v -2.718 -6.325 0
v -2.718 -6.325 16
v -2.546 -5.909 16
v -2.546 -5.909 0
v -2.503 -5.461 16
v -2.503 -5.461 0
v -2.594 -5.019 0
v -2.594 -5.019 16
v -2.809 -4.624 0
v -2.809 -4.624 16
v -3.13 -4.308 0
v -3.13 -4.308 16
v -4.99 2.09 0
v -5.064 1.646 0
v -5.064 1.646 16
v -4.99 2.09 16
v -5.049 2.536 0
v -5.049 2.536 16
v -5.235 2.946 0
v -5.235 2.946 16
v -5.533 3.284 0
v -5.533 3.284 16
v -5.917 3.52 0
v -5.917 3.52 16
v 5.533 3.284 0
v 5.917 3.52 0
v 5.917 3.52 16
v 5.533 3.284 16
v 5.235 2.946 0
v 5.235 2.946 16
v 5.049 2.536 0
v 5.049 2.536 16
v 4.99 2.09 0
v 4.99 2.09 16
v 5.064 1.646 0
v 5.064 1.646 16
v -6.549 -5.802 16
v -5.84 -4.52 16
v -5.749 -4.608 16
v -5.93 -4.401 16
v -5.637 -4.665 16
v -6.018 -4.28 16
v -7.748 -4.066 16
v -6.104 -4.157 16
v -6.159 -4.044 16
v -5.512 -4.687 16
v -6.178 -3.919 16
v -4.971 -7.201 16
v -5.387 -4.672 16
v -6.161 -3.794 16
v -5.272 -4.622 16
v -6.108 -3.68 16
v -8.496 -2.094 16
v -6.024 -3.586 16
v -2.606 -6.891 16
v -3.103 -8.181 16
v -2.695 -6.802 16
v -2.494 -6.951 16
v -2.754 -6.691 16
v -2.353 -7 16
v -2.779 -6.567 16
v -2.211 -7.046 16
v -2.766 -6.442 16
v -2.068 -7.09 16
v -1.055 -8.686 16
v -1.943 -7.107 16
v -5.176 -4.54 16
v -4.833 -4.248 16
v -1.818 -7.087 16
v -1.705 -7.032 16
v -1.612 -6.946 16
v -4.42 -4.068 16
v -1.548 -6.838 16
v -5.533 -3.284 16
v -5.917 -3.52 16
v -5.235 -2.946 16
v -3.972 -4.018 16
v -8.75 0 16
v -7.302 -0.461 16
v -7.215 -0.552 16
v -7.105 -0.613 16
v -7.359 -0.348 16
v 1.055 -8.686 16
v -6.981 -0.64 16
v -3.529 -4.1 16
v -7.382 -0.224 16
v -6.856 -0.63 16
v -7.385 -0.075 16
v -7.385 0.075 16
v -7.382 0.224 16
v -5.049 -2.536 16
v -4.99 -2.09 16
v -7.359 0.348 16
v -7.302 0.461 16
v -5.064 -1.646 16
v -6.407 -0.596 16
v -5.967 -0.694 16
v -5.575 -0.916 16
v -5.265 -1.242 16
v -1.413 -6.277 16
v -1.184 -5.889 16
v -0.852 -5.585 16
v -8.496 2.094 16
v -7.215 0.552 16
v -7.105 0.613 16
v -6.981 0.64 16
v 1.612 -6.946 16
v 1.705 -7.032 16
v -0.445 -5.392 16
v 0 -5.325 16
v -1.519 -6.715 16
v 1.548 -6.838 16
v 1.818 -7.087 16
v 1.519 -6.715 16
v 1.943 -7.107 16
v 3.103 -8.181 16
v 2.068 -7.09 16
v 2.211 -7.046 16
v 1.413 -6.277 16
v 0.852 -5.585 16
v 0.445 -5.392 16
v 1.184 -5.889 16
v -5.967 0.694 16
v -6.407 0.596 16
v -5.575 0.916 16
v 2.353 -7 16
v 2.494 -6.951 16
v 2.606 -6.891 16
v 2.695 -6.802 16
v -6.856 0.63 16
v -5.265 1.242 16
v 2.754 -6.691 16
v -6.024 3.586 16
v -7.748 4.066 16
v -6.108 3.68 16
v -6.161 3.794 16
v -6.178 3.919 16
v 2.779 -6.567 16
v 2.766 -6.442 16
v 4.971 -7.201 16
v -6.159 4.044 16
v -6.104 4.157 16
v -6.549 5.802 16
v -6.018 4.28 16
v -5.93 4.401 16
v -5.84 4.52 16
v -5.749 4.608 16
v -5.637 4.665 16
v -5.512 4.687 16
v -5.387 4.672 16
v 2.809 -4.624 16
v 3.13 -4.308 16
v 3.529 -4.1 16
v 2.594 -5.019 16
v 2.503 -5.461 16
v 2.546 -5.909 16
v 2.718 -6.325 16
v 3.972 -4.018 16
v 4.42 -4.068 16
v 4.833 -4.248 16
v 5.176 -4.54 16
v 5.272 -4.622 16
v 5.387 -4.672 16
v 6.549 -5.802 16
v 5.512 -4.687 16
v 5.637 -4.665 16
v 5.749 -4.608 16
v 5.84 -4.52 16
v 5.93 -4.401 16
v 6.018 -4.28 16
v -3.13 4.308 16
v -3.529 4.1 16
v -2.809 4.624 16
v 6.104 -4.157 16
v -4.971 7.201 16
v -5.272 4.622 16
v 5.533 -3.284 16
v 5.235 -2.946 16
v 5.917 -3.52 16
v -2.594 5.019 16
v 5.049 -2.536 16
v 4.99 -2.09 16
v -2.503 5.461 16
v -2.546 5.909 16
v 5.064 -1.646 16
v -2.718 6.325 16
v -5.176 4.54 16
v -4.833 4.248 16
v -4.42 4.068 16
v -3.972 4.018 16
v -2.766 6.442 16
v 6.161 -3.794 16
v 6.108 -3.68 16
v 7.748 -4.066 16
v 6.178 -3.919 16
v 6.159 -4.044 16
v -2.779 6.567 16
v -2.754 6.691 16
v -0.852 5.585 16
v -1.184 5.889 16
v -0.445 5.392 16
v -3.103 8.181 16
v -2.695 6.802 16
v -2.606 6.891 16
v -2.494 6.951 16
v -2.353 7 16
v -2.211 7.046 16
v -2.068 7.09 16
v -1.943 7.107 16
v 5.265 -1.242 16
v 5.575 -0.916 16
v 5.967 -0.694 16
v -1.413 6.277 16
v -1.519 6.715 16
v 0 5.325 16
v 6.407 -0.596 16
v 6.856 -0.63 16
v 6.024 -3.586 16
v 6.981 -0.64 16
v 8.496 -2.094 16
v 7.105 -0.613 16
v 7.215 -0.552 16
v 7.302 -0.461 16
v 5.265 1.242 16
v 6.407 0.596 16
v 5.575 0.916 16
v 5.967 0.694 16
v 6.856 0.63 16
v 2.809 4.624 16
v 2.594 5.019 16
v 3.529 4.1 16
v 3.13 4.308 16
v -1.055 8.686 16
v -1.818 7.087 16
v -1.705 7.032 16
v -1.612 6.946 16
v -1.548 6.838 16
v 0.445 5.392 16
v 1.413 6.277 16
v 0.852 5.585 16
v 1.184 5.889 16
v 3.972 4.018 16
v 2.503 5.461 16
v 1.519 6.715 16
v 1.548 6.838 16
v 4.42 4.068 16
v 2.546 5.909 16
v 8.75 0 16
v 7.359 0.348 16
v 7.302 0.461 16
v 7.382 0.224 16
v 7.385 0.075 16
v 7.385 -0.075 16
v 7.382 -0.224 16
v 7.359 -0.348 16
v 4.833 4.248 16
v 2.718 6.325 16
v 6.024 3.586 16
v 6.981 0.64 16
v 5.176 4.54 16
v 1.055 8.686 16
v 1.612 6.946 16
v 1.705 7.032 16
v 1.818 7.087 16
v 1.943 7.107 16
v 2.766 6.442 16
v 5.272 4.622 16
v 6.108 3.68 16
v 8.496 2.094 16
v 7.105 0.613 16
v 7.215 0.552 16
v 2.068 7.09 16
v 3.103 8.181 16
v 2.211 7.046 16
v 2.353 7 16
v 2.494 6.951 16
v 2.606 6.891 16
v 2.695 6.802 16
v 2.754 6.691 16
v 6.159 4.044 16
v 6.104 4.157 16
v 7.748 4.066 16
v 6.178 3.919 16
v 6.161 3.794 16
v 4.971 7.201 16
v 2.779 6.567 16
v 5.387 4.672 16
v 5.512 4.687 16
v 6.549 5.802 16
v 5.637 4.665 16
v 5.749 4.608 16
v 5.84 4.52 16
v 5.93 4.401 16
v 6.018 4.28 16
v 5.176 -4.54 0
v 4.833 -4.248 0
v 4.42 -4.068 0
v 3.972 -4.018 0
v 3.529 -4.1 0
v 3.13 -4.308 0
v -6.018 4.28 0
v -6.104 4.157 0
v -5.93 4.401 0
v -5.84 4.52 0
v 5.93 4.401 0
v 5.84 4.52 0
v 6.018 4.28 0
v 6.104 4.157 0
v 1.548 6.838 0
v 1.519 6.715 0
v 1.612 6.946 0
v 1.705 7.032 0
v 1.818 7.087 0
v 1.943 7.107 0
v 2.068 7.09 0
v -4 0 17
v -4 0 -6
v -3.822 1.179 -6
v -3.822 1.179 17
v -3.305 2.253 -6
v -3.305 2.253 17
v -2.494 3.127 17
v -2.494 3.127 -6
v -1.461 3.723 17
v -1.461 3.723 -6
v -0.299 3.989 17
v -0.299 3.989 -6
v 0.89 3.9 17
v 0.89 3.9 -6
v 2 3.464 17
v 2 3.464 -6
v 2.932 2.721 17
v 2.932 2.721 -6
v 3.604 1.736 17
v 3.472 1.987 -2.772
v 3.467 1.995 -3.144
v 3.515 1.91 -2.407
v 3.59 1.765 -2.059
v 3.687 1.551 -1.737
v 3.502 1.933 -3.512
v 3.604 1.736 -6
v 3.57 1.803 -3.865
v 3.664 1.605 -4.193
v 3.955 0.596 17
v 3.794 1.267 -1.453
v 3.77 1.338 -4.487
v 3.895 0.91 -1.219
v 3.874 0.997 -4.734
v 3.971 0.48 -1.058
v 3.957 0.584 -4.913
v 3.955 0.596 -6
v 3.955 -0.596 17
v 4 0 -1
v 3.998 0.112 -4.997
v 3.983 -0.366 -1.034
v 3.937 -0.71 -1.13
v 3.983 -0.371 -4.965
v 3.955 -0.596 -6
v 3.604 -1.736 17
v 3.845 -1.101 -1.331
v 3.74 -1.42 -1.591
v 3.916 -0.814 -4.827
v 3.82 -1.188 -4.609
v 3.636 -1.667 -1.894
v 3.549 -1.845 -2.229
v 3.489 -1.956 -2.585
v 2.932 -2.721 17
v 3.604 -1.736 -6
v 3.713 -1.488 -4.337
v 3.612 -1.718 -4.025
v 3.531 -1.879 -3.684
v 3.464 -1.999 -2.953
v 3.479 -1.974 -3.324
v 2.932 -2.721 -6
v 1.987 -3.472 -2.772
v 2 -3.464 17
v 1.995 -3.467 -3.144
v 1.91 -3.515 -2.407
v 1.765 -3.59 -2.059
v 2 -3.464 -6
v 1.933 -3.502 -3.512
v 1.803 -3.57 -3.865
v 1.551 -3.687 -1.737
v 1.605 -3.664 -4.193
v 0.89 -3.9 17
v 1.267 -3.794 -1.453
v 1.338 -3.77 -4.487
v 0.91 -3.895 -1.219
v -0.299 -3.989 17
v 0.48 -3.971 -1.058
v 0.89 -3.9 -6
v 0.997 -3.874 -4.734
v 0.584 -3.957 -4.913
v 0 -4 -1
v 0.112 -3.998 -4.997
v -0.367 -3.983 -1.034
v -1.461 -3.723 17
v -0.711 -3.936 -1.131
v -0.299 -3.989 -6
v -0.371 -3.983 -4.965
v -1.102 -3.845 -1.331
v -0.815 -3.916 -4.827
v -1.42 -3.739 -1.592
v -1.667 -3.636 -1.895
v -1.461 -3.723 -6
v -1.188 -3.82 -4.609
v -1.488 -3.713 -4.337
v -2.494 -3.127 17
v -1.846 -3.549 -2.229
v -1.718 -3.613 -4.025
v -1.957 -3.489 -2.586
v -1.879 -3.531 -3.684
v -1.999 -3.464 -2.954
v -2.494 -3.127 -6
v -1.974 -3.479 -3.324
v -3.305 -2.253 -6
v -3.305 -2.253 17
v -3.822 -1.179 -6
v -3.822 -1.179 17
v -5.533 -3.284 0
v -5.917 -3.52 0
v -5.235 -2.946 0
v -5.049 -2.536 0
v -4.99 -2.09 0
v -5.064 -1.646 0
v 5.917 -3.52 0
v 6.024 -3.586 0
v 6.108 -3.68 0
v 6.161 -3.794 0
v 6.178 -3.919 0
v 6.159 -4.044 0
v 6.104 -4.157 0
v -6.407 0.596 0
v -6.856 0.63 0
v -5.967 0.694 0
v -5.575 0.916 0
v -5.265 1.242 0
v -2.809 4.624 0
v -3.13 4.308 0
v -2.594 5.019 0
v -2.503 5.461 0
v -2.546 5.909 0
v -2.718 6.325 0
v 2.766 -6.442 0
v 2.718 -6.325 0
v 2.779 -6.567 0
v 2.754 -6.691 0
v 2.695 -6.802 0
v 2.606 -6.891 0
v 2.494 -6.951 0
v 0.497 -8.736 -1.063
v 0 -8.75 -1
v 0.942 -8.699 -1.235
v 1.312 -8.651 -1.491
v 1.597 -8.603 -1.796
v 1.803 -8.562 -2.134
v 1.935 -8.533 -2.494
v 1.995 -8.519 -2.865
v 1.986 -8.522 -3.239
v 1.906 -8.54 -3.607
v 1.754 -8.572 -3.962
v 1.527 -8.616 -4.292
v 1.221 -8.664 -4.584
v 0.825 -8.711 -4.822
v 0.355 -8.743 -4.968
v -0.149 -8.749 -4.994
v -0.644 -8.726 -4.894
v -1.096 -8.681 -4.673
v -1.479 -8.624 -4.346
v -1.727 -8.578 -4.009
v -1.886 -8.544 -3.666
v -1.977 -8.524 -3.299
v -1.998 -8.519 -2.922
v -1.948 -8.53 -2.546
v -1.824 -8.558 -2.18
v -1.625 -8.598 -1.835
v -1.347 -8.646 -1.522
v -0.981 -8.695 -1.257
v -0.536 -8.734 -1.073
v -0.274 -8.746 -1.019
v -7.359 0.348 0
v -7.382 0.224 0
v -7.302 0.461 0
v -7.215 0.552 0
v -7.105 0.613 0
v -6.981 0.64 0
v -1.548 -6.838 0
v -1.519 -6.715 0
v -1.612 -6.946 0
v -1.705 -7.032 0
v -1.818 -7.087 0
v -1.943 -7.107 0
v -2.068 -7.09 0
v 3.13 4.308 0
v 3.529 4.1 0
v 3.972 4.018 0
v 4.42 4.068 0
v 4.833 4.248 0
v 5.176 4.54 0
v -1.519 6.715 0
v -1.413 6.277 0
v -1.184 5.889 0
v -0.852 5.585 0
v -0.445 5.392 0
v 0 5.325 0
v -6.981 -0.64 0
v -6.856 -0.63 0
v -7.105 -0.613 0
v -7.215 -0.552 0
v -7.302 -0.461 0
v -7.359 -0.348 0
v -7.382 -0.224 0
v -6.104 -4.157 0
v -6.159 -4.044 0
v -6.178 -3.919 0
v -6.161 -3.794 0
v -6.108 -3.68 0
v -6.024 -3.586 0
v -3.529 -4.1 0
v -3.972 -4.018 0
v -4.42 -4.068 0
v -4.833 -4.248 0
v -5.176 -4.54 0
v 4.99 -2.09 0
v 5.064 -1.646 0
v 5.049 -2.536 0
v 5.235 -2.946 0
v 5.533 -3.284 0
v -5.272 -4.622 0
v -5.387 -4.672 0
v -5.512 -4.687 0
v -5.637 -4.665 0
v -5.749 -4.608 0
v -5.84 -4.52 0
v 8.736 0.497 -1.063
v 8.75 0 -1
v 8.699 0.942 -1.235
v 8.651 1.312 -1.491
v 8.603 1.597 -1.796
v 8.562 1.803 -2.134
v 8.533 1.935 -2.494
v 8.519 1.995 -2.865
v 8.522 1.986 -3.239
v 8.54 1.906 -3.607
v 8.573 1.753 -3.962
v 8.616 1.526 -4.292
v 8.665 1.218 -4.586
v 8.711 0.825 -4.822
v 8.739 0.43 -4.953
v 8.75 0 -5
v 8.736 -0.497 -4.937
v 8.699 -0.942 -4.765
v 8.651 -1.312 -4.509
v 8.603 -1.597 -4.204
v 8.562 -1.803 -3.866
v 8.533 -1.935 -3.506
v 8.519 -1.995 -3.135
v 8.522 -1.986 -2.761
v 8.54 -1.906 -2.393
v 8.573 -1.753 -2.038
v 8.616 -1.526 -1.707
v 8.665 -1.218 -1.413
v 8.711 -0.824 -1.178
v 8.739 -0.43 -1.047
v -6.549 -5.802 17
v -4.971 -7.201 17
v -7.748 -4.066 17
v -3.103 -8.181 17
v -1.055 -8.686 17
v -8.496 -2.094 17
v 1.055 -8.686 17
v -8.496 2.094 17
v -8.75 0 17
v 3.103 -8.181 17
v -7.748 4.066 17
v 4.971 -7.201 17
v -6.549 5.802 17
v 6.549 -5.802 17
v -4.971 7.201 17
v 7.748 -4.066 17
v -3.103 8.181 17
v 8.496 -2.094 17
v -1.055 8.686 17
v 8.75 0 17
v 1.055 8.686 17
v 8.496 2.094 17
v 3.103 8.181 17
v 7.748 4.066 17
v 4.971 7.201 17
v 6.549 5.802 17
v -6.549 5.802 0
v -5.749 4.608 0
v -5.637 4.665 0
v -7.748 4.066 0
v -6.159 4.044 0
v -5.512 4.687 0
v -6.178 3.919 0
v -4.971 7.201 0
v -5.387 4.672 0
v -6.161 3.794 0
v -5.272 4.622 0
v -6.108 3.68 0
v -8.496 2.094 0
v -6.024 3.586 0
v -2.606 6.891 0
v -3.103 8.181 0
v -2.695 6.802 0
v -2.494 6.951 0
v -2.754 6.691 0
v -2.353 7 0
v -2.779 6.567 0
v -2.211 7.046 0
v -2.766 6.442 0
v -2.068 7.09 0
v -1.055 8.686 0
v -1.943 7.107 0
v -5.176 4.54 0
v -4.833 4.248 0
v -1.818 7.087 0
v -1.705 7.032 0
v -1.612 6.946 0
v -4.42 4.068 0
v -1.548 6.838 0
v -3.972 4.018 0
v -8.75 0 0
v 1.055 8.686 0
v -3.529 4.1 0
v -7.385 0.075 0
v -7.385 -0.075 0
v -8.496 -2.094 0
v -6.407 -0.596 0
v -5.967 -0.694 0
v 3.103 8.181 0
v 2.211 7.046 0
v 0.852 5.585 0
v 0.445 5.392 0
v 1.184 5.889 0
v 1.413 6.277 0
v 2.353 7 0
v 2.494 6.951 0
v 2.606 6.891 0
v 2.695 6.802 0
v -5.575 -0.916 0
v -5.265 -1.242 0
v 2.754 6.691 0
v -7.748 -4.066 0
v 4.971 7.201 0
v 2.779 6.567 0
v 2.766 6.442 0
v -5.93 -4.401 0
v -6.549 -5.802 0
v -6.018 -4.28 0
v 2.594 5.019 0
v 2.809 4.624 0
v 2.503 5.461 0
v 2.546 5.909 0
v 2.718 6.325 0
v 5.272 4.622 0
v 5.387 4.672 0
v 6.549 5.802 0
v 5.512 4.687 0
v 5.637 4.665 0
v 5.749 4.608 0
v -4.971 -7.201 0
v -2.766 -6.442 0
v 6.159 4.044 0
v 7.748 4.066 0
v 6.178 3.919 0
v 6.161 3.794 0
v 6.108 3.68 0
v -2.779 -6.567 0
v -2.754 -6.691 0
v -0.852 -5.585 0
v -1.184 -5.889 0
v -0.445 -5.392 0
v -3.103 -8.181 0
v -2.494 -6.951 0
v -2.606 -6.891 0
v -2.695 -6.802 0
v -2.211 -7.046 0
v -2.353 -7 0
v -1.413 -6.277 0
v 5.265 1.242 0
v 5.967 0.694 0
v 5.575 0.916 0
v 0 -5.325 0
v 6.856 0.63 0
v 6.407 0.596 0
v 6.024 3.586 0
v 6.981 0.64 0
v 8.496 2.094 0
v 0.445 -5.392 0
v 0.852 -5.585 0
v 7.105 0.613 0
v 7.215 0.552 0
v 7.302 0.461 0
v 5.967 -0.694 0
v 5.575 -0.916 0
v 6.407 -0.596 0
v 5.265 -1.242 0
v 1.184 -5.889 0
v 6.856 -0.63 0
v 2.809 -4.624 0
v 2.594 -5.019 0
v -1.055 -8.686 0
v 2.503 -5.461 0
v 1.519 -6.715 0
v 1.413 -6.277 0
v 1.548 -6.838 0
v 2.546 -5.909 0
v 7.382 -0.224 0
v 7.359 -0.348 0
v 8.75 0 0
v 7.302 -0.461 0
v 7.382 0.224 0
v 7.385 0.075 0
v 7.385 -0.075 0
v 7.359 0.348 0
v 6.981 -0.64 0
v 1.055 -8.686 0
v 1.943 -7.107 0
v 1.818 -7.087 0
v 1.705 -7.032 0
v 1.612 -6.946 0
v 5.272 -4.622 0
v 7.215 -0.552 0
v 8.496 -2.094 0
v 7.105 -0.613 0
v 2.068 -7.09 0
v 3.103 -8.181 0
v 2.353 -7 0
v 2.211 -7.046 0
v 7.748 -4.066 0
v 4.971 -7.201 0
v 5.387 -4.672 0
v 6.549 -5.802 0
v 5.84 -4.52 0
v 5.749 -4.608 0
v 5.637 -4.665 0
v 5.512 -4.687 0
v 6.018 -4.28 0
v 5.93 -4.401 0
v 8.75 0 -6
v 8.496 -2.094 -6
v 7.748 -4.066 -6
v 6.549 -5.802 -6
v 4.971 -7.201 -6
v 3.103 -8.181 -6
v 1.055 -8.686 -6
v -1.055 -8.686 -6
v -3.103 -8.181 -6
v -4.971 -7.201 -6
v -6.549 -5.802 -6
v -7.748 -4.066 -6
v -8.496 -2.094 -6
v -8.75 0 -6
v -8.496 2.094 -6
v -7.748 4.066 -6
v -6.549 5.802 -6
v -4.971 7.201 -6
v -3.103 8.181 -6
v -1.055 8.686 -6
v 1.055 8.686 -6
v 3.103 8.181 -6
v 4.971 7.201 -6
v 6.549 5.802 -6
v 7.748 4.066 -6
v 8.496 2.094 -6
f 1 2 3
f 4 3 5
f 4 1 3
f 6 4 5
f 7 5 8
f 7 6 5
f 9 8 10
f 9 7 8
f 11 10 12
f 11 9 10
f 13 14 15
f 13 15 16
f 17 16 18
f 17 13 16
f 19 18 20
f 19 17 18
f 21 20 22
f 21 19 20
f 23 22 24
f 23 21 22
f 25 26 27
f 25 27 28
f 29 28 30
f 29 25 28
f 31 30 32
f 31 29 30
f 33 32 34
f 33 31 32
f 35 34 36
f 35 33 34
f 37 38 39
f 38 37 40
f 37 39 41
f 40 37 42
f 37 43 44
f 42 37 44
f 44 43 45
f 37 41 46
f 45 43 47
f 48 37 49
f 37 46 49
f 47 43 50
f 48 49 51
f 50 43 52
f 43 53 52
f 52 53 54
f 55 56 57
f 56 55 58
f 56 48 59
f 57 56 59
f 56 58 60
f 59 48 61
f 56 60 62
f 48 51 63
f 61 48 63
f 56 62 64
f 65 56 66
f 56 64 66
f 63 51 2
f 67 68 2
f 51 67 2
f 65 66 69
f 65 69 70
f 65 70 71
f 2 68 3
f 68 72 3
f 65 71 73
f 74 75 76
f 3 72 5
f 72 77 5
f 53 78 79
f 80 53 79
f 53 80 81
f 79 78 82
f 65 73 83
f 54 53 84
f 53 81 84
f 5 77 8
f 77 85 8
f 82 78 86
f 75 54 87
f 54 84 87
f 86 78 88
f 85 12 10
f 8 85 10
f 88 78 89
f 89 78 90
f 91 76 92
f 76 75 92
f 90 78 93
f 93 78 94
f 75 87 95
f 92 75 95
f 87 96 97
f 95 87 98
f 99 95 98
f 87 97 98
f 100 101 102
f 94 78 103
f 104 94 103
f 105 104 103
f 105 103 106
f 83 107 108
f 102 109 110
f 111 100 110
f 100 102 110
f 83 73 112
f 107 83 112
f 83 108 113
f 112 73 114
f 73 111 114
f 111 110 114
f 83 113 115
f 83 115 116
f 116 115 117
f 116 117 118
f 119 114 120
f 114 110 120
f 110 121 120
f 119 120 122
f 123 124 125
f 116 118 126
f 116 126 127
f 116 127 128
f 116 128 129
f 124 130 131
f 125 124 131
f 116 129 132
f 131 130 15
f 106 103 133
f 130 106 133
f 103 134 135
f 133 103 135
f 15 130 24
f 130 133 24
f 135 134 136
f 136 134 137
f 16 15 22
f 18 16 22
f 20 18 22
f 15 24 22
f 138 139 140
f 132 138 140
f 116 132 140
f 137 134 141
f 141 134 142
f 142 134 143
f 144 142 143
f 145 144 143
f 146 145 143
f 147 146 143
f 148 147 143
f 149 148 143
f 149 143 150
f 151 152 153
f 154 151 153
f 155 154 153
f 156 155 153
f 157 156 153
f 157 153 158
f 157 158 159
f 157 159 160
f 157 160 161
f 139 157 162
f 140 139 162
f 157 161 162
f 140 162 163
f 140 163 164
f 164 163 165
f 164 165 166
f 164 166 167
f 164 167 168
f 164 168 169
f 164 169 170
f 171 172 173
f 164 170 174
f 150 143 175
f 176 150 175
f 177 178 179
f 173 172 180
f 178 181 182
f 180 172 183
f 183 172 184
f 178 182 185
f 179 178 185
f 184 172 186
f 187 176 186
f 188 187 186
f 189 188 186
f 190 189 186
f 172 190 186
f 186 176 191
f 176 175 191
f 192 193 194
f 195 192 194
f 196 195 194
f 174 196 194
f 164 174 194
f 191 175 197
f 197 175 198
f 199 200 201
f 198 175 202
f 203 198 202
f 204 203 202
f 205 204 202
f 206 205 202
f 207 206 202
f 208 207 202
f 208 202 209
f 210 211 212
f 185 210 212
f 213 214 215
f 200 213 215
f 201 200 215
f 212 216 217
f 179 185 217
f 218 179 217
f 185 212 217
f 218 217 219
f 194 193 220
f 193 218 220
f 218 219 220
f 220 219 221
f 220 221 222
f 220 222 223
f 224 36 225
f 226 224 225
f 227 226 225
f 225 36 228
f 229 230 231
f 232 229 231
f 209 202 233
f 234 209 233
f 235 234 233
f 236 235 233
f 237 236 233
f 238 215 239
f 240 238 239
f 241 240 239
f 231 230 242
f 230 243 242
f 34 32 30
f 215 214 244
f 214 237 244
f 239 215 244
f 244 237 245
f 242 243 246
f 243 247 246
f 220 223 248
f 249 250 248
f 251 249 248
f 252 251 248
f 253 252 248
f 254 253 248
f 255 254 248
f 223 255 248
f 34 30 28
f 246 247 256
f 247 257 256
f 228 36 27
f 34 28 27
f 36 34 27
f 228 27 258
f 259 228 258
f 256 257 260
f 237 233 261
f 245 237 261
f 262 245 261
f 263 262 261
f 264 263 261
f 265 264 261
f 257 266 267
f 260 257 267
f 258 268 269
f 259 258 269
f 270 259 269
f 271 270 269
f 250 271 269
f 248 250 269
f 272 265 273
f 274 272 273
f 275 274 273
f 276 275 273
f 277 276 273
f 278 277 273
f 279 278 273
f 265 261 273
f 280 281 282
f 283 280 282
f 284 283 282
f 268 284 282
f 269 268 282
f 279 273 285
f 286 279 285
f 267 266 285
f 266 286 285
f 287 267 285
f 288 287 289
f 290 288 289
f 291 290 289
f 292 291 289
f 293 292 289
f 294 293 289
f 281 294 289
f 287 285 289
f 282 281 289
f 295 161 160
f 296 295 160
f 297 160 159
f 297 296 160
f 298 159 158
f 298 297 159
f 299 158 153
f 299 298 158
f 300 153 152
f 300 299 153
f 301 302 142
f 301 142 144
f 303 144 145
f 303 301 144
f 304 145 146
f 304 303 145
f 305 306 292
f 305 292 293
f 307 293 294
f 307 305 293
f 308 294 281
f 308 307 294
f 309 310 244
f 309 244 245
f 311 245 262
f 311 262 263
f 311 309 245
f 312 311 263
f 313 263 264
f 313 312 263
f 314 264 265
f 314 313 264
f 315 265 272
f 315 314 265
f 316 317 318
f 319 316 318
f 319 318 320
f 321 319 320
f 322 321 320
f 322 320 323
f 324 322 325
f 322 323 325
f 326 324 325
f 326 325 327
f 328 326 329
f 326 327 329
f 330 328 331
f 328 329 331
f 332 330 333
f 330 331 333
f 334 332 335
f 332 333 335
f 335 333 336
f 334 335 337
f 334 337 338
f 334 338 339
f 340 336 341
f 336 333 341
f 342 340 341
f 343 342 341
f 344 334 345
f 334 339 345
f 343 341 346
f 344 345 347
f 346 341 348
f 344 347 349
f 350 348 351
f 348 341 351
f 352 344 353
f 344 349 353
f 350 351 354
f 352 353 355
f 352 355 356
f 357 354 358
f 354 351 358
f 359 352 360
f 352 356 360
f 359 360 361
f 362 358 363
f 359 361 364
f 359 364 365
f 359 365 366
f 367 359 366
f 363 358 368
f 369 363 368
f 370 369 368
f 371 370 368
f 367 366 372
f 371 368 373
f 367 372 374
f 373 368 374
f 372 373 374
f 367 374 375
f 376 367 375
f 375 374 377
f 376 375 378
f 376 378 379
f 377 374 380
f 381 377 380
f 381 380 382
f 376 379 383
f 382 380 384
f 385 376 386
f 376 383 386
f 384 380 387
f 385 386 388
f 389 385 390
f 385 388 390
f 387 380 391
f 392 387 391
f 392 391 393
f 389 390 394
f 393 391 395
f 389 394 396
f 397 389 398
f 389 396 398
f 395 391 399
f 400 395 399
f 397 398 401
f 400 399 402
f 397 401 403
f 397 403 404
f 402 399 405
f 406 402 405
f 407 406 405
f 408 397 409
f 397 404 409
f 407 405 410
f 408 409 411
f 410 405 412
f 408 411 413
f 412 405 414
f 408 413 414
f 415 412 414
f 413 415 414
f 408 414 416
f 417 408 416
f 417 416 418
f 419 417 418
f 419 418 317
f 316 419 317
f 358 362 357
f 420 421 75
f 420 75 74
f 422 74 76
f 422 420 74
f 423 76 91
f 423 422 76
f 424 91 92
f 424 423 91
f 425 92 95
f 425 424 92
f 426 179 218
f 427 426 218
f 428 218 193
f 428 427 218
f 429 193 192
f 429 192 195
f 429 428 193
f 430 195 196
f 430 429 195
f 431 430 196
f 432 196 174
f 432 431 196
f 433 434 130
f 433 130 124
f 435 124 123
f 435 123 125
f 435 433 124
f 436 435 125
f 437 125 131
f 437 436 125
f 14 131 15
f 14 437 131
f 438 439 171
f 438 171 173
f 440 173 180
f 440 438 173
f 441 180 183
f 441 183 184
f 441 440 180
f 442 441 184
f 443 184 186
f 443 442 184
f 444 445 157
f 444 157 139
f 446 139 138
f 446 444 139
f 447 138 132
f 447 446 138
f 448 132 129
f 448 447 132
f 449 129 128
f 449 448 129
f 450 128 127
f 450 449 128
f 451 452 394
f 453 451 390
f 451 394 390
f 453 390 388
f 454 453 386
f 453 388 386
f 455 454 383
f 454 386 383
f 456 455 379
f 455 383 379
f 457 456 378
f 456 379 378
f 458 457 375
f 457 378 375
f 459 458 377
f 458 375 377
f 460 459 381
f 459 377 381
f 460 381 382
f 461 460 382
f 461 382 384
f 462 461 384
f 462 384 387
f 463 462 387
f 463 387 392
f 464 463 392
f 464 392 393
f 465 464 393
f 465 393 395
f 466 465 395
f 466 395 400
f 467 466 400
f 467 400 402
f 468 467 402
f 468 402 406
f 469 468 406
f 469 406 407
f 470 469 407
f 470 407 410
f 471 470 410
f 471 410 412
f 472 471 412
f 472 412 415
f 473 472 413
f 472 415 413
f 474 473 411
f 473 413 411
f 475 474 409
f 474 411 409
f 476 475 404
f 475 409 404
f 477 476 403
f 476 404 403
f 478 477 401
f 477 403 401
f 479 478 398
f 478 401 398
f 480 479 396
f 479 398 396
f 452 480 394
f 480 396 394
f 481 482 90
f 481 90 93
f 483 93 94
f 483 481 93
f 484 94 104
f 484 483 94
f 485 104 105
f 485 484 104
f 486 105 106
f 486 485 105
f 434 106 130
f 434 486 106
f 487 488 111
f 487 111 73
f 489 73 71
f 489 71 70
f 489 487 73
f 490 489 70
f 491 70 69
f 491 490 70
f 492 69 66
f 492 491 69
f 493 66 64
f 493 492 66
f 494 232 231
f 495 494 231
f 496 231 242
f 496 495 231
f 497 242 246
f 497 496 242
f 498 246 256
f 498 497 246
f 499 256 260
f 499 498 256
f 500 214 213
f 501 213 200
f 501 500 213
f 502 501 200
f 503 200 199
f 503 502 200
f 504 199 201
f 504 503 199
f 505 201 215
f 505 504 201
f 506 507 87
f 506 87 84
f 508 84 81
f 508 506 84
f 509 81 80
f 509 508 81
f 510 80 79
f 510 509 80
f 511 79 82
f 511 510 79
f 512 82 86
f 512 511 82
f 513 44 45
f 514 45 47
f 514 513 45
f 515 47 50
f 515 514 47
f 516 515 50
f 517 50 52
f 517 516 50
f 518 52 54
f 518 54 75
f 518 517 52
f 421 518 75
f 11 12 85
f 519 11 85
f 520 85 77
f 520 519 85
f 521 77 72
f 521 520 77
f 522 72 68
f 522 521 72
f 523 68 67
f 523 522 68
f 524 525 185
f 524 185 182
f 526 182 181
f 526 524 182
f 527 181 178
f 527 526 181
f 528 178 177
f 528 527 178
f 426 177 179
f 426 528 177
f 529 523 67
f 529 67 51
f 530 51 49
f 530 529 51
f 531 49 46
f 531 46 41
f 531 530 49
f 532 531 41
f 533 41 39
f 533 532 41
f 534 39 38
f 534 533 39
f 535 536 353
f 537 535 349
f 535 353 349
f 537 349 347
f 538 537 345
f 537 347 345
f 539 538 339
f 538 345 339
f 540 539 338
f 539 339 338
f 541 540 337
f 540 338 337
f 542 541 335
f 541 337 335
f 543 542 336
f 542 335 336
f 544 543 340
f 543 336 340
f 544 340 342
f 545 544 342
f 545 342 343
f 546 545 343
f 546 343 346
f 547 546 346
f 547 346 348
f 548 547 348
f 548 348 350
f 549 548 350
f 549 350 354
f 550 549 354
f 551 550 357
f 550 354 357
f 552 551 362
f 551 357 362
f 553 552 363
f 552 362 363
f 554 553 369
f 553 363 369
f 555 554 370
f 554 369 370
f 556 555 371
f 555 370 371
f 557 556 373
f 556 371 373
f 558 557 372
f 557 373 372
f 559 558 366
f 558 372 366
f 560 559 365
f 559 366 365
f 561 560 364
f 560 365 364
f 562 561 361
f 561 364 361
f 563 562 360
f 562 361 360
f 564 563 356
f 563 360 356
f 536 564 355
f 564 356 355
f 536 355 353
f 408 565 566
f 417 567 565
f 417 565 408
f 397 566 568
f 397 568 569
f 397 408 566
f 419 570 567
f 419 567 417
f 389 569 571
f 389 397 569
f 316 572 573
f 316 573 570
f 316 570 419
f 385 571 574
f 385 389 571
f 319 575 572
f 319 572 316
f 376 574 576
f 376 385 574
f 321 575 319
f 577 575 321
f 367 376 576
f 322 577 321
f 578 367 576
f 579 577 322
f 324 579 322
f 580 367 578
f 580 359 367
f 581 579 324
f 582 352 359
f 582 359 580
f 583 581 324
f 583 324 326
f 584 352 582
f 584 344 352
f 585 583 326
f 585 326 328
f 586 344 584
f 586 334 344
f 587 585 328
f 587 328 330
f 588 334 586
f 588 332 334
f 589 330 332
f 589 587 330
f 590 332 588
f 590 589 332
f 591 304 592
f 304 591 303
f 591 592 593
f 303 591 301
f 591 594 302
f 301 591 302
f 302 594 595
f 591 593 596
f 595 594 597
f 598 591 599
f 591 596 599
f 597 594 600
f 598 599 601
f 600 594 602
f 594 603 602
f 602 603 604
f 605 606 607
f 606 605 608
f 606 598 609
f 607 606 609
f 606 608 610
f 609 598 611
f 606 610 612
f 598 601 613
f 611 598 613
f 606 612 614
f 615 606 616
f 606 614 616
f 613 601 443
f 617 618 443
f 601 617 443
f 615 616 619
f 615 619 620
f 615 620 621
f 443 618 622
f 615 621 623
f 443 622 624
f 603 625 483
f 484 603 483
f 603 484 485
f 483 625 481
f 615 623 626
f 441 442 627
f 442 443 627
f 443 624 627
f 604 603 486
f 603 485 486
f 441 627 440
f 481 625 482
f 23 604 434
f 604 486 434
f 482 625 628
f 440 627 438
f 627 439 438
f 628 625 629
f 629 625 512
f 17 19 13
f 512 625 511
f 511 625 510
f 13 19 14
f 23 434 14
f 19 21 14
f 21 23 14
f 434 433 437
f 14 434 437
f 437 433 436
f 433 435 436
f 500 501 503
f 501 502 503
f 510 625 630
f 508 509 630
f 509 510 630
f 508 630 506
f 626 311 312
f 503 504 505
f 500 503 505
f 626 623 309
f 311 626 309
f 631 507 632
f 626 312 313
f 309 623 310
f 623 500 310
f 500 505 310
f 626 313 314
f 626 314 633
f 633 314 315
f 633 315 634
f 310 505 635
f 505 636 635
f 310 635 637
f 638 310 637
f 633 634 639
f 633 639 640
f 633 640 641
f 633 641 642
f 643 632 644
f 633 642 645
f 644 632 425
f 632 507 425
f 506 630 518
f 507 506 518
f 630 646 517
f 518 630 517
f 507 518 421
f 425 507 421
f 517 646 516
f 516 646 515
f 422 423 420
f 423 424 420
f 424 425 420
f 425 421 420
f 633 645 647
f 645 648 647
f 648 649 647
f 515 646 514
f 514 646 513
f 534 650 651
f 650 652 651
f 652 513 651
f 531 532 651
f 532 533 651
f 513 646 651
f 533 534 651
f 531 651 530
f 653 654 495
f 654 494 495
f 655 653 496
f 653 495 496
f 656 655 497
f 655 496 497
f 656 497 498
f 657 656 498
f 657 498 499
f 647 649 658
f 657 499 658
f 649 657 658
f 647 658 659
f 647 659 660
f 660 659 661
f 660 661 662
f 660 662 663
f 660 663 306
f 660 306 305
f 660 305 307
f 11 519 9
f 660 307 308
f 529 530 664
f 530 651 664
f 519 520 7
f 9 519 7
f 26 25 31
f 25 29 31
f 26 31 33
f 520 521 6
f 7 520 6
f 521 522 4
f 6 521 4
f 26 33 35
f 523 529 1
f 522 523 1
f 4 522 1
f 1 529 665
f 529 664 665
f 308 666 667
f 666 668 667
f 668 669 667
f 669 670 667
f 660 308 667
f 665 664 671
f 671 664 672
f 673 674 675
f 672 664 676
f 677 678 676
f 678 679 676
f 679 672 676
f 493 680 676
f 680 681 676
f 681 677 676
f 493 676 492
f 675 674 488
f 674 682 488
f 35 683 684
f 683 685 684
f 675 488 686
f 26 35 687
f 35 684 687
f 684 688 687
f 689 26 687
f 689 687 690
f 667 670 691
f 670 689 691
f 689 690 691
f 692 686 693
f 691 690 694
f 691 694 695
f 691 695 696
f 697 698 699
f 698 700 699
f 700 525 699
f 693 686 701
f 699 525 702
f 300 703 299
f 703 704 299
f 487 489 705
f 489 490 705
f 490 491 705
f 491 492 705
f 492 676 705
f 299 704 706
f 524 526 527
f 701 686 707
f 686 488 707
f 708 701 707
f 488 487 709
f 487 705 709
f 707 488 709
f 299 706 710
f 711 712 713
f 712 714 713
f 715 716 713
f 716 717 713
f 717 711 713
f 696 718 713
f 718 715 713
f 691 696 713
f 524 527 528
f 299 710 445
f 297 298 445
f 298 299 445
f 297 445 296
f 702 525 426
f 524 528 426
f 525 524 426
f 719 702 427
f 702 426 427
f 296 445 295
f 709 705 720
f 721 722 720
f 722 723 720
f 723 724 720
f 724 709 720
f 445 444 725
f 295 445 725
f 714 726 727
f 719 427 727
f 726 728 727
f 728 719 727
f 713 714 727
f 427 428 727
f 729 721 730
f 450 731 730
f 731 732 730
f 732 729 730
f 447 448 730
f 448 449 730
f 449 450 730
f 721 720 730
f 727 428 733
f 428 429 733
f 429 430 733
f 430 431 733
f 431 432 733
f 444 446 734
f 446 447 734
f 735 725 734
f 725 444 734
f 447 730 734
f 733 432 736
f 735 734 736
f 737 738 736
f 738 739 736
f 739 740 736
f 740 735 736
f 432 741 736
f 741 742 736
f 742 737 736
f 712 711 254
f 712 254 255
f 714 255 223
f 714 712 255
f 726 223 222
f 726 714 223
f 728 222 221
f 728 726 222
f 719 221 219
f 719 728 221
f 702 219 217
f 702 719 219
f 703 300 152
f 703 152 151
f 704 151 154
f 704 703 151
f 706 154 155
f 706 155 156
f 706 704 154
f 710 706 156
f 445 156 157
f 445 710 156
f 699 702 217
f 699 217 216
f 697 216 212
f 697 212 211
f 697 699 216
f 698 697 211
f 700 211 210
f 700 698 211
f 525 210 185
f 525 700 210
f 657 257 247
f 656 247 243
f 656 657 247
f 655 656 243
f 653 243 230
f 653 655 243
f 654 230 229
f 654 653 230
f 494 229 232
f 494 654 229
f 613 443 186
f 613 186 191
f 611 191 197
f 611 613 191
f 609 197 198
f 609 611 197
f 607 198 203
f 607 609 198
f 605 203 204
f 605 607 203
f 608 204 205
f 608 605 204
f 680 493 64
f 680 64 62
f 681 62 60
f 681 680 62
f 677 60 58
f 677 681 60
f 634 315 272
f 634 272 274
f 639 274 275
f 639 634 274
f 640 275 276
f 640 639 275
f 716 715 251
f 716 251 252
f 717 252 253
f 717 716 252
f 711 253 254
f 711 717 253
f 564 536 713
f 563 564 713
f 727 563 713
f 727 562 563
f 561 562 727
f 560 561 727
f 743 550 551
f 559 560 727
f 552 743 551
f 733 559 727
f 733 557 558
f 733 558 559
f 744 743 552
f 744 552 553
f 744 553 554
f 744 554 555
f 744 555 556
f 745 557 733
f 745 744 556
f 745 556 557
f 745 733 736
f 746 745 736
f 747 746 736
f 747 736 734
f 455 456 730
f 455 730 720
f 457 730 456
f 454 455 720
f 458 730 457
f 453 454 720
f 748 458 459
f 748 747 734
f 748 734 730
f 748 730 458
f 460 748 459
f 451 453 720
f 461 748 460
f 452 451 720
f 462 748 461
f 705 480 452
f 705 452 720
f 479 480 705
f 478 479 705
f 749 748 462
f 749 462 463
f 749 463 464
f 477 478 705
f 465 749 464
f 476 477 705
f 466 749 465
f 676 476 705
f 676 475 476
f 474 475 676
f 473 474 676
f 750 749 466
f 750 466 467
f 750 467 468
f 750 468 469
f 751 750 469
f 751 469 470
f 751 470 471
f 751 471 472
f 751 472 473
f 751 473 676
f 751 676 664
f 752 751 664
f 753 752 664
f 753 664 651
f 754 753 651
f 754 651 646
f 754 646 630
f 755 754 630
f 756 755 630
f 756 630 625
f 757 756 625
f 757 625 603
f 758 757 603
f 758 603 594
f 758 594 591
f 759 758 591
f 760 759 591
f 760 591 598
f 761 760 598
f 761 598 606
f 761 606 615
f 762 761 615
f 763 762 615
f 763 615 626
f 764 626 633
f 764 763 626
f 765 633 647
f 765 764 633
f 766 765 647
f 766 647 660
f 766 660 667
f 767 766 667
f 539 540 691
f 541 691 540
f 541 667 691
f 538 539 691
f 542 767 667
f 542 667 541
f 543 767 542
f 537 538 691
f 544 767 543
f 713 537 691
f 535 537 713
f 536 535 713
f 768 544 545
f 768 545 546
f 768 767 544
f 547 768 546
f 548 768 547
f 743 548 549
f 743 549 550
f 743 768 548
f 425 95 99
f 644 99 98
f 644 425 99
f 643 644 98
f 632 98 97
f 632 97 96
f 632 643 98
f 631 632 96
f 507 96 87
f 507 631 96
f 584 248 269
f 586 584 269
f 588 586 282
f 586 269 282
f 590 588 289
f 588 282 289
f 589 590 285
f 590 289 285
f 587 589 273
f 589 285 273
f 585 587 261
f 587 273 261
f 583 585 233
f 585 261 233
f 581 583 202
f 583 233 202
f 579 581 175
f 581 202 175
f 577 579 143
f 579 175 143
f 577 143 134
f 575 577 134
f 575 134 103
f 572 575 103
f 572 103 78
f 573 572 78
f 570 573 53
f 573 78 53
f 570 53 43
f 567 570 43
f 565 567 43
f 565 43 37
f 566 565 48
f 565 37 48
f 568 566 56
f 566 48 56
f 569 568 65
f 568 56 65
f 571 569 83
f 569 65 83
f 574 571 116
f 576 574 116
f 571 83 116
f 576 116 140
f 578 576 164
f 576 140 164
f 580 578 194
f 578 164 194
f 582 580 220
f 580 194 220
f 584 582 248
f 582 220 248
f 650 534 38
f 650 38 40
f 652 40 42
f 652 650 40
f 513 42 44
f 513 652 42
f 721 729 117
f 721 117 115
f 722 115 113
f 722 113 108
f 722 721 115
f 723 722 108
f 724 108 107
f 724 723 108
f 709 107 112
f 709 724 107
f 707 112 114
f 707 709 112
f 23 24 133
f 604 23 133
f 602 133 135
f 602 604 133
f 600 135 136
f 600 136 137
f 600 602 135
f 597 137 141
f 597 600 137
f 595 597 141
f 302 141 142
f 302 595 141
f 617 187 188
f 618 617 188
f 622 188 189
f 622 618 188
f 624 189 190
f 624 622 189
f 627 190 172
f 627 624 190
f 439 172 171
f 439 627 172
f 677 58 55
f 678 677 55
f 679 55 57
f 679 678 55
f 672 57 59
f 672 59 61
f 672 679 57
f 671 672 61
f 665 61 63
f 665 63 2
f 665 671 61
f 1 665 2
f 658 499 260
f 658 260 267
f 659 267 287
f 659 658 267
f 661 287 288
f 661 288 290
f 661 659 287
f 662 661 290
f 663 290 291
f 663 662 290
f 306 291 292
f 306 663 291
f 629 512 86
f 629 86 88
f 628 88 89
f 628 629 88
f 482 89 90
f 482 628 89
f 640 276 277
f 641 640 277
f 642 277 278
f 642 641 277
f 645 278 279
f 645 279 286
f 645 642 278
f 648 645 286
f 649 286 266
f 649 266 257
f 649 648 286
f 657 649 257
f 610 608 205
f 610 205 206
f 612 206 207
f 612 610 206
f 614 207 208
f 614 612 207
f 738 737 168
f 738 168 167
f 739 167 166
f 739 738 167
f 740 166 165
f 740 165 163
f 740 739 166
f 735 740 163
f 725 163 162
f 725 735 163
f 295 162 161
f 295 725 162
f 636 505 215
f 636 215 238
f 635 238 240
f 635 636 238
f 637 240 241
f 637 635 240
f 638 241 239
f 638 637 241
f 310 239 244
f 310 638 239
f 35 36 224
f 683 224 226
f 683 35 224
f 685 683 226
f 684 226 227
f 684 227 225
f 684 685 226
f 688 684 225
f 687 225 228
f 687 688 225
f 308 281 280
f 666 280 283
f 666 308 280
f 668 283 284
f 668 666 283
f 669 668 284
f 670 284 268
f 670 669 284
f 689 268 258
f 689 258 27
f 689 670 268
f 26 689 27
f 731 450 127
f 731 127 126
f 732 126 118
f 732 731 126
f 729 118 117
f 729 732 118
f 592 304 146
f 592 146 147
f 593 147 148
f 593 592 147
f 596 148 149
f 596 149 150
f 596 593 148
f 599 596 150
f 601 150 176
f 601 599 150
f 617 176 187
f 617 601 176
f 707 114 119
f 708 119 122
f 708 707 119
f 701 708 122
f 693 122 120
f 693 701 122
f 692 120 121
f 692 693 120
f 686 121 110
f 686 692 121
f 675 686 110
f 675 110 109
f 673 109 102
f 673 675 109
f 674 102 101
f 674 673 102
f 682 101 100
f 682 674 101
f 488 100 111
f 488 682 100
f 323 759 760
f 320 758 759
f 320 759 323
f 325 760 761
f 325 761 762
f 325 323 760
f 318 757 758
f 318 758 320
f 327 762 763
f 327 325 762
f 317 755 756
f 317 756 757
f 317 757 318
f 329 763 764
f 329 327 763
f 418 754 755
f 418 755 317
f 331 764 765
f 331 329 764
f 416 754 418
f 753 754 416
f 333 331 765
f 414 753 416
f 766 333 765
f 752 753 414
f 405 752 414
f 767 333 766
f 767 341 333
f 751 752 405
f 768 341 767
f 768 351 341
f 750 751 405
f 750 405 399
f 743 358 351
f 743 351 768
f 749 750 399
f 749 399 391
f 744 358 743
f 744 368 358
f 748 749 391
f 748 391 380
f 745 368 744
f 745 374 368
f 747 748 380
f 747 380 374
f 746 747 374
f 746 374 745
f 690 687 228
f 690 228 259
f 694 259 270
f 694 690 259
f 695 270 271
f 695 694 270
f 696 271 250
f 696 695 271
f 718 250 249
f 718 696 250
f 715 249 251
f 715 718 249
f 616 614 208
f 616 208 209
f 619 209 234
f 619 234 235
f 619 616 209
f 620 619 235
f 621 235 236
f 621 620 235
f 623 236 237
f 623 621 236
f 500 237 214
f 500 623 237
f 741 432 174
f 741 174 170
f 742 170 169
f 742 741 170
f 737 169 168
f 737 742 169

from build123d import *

# Parameters (mm, degrees)
BOSS_EXTRUDE1_DEPTH = 16
SKETCH2_R           = 8.75
BOSS_EXTRUDE2_DEPTH = 1
BOSS_EXTRUDE3_START = 6
SKETCH3_R           = 8.75
BOSS_EXTRUDE3_DEPTH = 6
SKETCH4_R           = 4
CUT_EXTRUDE1_DEPTH  = 27.117522853
SKETCH5_R           = 2
CUT_EXTRUDE2_DEPTH  = 22.026768653
CIRPATTERN1_COUNT   = 2
CIRPATTERN1_ANGLE   = 90


with BuildPart() as part:
    # Sketch1 → Boss-Extrude1 (new body)
    with BuildSketch(Plane.XY):
        with BuildLine():
            ThreePointArc((0, 5.325), (1.029470644, 5.724915472), (1.519005236, 6.7149145))
            ThreePointArc((1.519005236, 6.7149145), (1.704817188, 7.031923192), (2.067709649, 7.089626352))
            ThreePointArc((2.067709649, 7.089626352), (2.282090503, 7.023552373), (2.494365569, 6.95099744))
            ThreePointArc((2.494365569, 6.95099744), (2.75403467, 6.691011766), (2.718026663, 6.325328822))
            ThreePointArc((2.718026663, 6.325328822), (2.53216164, 5.236661571), (3.129956468, 4.308015495))
            ThreePointArc((3.129956468, 4.308015495), (4.197880131, 4.026446247), (5.175828764, 4.53963107))
            ThreePointArc((5.175828764, 4.53963107), (5.512486825, 4.686878964), (5.839990059, 4.520258965))
            ThreePointArc((5.839990059, 4.520258965), (5.974590503, 4.340794088), (6.103677919, 4.157323762))
            ThreePointArc((6.103677919, 4.157323762), (6.16093889, 3.794361265), (5.916864759, 3.519682524))
            ThreePointArc((5.916864759, 3.519682524), (5.126594241, 2.748180936), (5.064375949, 1.645515495))
            ThreePointArc((5.064375949, 1.645515495), (5.762842089, 0.790011408), (6.855661624, 0.630362868))
            ThreePointArc((6.855661624, 0.630362868), (7.214573857, 0.551606273), (7.381592761, 0.224306291))
            ThreePointArc((7.381592761, 0.224306291), (7.385, 0), (7.381592761, -0.224306291))
            ThreePointArc((7.381592761, -0.224306291), (7.214573857, -0.551606273), (6.855661624, -0.630362868))
            ThreePointArc((6.855661624, -0.630362868), (5.762842089, -0.790011408), (5.064375949, -1.645515495))
            ThreePointArc((5.064375949, -1.645515495), (5.126594241, -2.748180936), (5.916864759, -3.519682524))
            ThreePointArc((5.916864759, -3.519682524), (6.16093889, -3.794361265), (6.103677919, -4.157323762))
            ThreePointArc((6.103677919, -4.157323762), (5.974590503, -4.340794088), (5.839990059, -4.520258965))
            ThreePointArc((5.839990059, -4.520258965), (5.512486825, -4.686878964), (5.175828764, -4.53963107))
            ThreePointArc((5.175828764, -4.53963107), (4.197880131, -4.026446247), (3.129956468, -4.308015495))
            ThreePointArc((3.129956468, -4.308015495), (2.532161639, -5.236661571), (2.718026663, -6.325328822))
            ThreePointArc((2.718026663, -6.325328822), (2.75403467, -6.691011766), (2.494365569, -6.95099744))
            ThreePointArc((2.494365569, -6.95099744), (2.282090503, -7.023552373), (2.067709649, -7.089626352))
            ThreePointArc((2.067709649, -7.089626352), (1.704817188, -7.031923192), (1.519005236, -6.7149145))
            ThreePointArc((1.519005236, -6.7149145), (1.029470644, -5.724915472), (0, -5.325))
            ThreePointArc((0, -5.325), (-1.029470644, -5.724915472), (-1.519005236, -6.7149145))
            ThreePointArc((-1.519005236, -6.7149145), (-1.704817188, -7.031923192), (-2.067709649, -7.089626352))
            ThreePointArc((-2.067709649, -7.089626352), (-2.282090503, -7.023552373), (-2.494365569, -6.95099744))
            ThreePointArc((-2.494365569, -6.95099744), (-2.75403467, -6.691011766), (-2.718026663, -6.325328822))
            ThreePointArc((-2.718026663, -6.325328822), (-2.53216164, -5.236661571), (-3.129956468, -4.308015495))
            ThreePointArc((-3.129956468, -4.308015495), (-4.197880131, -4.026446247), (-5.175828764, -4.53963107))
            ThreePointArc((-5.175828764, -4.53963107), (-5.512486825, -4.686878964), (-5.839990059, -4.520258965))
            ThreePointArc((-5.839990059, -4.520258965), (-5.974590503, -4.340794088), (-6.103677919, -4.157323762))
            ThreePointArc((-6.103677919, -4.157323762), (-6.16093889, -3.794361265), (-5.916864759, -3.519682524))
            ThreePointArc((-5.916864759, -3.519682524), (-5.126594241, -2.748180936), (-5.064375949, -1.645515495))
            ThreePointArc((-5.064375949, -1.645515495), (-5.762842089, -0.790011408), (-6.855661624, -0.630362868))
            ThreePointArc((-6.855661624, -0.630362868), (-7.214573857, -0.551606273), (-7.381592761, -0.224306291))
            ThreePointArc((-7.381592761, -0.224306291), (-7.385, 0), (-7.381592761, 0.224306291))
            ThreePointArc((-7.381592761, 0.224306291), (-7.214573857, 0.551606273), (-6.855661624, 0.630362868))
            ThreePointArc((-6.855661624, 0.630362868), (-5.762842089, 0.790011408), (-5.064375949, 1.645515495))
            ThreePointArc((-5.064375949, 1.645515495), (-5.126594241, 2.748180936), (-5.916864759, 3.519682524))
            ThreePointArc((-5.916864759, 3.519682524), (-6.16093889, 3.794361265), (-6.103677919, 4.157323762))
            ThreePointArc((-6.103677919, 4.157323762), (-5.974590503, 4.340794088), (-5.839990059, 4.520258965))
            ThreePointArc((-5.839990059, 4.520258965), (-5.512486825, 4.686878964), (-5.175828764, 4.53963107))
            ThreePointArc((-5.175828764, 4.53963107), (-4.197880131, 4.026446247), (-3.129956468, 4.308015495))
            ThreePointArc((-3.129956468, 4.308015495), (-2.532161639, 5.236661571), (-2.718026663, 6.325328822))
            ThreePointArc((-2.718026663, 6.325328822), (-2.75403467, 6.691011766), (-2.494365569, 6.95099744))
            ThreePointArc((-2.494365569, 6.95099744), (-2.282090503, 7.023552373), (-2.067709649, 7.089626352))
            ThreePointArc((-2.067709649, 7.089626352), (-1.704817188, 7.031923192), (-1.519005236, 6.7149145))
            ThreePointArc((-1.519005236, 6.7149145), (-1.029470644, 5.724915472), (0, 5.325))
        make_face()
    extrude(amount=BOSS_EXTRUDE1_DEPTH)

    # Sketch2 → Boss-Extrude2 (add)
    with BuildSketch(Plane.XY.offset(16)):
        Circle(SKETCH2_R)
    extrude(amount=BOSS_EXTRUDE2_DEPTH)

    # Sketch3 → Boss-Extrude3 (add)
    with BuildSketch(Plane(origin=(0, 0, 0), x_dir=(-1, 0, 0), z_dir=(0, 0, -1)).offset(BOSS_EXTRUDE3_START)):
        with Locations(Location((0, 0, 0), (0, 0, 180))):
            Circle(SKETCH3_R)
    extrude(amount=-BOSS_EXTRUDE3_DEPTH)

    # Sketch4 → Cut-Extrude1 (cut, through all)
    with BuildSketch(Plane(origin=(0, 0, -6), x_dir=(-1, 0, 0), z_dir=(0, 0, -1))):
        Circle(SKETCH4_R)
    extrude(amount=-CUT_EXTRUDE1_DEPTH, mode=Mode.SUBTRACT)

    # Sketch5 → Cut-Extrude2 (cut, through all)
    with BuildSketch(Plane(origin=(0, 0, 0), x_dir=(1, 0, 0), z_dir=(0, 1, 0))):
        with Locations(Location((0, 3, 0), (0, 0, 270))):
            Circle(SKETCH5_R)
    cut_extrude2 = extrude(amount=-CUT_EXTRUDE2_DEPTH, mode=Mode.SUBTRACT)

    # CirPattern1: Cut-Extrude2 ×2 about axis
    cirpattern1_axis = Axis((0, 0, 16), (0, 0, 1))
    for i in range(1, CIRPATTERN1_COUNT):
        add(cut_extrude2.rotate(cirpattern1_axis, i * CIRPATTERN1_ANGLE / (CIRPATTERN1_COUNT - 1)), mode=Mode.SUBTRACT)


solid = part.part
